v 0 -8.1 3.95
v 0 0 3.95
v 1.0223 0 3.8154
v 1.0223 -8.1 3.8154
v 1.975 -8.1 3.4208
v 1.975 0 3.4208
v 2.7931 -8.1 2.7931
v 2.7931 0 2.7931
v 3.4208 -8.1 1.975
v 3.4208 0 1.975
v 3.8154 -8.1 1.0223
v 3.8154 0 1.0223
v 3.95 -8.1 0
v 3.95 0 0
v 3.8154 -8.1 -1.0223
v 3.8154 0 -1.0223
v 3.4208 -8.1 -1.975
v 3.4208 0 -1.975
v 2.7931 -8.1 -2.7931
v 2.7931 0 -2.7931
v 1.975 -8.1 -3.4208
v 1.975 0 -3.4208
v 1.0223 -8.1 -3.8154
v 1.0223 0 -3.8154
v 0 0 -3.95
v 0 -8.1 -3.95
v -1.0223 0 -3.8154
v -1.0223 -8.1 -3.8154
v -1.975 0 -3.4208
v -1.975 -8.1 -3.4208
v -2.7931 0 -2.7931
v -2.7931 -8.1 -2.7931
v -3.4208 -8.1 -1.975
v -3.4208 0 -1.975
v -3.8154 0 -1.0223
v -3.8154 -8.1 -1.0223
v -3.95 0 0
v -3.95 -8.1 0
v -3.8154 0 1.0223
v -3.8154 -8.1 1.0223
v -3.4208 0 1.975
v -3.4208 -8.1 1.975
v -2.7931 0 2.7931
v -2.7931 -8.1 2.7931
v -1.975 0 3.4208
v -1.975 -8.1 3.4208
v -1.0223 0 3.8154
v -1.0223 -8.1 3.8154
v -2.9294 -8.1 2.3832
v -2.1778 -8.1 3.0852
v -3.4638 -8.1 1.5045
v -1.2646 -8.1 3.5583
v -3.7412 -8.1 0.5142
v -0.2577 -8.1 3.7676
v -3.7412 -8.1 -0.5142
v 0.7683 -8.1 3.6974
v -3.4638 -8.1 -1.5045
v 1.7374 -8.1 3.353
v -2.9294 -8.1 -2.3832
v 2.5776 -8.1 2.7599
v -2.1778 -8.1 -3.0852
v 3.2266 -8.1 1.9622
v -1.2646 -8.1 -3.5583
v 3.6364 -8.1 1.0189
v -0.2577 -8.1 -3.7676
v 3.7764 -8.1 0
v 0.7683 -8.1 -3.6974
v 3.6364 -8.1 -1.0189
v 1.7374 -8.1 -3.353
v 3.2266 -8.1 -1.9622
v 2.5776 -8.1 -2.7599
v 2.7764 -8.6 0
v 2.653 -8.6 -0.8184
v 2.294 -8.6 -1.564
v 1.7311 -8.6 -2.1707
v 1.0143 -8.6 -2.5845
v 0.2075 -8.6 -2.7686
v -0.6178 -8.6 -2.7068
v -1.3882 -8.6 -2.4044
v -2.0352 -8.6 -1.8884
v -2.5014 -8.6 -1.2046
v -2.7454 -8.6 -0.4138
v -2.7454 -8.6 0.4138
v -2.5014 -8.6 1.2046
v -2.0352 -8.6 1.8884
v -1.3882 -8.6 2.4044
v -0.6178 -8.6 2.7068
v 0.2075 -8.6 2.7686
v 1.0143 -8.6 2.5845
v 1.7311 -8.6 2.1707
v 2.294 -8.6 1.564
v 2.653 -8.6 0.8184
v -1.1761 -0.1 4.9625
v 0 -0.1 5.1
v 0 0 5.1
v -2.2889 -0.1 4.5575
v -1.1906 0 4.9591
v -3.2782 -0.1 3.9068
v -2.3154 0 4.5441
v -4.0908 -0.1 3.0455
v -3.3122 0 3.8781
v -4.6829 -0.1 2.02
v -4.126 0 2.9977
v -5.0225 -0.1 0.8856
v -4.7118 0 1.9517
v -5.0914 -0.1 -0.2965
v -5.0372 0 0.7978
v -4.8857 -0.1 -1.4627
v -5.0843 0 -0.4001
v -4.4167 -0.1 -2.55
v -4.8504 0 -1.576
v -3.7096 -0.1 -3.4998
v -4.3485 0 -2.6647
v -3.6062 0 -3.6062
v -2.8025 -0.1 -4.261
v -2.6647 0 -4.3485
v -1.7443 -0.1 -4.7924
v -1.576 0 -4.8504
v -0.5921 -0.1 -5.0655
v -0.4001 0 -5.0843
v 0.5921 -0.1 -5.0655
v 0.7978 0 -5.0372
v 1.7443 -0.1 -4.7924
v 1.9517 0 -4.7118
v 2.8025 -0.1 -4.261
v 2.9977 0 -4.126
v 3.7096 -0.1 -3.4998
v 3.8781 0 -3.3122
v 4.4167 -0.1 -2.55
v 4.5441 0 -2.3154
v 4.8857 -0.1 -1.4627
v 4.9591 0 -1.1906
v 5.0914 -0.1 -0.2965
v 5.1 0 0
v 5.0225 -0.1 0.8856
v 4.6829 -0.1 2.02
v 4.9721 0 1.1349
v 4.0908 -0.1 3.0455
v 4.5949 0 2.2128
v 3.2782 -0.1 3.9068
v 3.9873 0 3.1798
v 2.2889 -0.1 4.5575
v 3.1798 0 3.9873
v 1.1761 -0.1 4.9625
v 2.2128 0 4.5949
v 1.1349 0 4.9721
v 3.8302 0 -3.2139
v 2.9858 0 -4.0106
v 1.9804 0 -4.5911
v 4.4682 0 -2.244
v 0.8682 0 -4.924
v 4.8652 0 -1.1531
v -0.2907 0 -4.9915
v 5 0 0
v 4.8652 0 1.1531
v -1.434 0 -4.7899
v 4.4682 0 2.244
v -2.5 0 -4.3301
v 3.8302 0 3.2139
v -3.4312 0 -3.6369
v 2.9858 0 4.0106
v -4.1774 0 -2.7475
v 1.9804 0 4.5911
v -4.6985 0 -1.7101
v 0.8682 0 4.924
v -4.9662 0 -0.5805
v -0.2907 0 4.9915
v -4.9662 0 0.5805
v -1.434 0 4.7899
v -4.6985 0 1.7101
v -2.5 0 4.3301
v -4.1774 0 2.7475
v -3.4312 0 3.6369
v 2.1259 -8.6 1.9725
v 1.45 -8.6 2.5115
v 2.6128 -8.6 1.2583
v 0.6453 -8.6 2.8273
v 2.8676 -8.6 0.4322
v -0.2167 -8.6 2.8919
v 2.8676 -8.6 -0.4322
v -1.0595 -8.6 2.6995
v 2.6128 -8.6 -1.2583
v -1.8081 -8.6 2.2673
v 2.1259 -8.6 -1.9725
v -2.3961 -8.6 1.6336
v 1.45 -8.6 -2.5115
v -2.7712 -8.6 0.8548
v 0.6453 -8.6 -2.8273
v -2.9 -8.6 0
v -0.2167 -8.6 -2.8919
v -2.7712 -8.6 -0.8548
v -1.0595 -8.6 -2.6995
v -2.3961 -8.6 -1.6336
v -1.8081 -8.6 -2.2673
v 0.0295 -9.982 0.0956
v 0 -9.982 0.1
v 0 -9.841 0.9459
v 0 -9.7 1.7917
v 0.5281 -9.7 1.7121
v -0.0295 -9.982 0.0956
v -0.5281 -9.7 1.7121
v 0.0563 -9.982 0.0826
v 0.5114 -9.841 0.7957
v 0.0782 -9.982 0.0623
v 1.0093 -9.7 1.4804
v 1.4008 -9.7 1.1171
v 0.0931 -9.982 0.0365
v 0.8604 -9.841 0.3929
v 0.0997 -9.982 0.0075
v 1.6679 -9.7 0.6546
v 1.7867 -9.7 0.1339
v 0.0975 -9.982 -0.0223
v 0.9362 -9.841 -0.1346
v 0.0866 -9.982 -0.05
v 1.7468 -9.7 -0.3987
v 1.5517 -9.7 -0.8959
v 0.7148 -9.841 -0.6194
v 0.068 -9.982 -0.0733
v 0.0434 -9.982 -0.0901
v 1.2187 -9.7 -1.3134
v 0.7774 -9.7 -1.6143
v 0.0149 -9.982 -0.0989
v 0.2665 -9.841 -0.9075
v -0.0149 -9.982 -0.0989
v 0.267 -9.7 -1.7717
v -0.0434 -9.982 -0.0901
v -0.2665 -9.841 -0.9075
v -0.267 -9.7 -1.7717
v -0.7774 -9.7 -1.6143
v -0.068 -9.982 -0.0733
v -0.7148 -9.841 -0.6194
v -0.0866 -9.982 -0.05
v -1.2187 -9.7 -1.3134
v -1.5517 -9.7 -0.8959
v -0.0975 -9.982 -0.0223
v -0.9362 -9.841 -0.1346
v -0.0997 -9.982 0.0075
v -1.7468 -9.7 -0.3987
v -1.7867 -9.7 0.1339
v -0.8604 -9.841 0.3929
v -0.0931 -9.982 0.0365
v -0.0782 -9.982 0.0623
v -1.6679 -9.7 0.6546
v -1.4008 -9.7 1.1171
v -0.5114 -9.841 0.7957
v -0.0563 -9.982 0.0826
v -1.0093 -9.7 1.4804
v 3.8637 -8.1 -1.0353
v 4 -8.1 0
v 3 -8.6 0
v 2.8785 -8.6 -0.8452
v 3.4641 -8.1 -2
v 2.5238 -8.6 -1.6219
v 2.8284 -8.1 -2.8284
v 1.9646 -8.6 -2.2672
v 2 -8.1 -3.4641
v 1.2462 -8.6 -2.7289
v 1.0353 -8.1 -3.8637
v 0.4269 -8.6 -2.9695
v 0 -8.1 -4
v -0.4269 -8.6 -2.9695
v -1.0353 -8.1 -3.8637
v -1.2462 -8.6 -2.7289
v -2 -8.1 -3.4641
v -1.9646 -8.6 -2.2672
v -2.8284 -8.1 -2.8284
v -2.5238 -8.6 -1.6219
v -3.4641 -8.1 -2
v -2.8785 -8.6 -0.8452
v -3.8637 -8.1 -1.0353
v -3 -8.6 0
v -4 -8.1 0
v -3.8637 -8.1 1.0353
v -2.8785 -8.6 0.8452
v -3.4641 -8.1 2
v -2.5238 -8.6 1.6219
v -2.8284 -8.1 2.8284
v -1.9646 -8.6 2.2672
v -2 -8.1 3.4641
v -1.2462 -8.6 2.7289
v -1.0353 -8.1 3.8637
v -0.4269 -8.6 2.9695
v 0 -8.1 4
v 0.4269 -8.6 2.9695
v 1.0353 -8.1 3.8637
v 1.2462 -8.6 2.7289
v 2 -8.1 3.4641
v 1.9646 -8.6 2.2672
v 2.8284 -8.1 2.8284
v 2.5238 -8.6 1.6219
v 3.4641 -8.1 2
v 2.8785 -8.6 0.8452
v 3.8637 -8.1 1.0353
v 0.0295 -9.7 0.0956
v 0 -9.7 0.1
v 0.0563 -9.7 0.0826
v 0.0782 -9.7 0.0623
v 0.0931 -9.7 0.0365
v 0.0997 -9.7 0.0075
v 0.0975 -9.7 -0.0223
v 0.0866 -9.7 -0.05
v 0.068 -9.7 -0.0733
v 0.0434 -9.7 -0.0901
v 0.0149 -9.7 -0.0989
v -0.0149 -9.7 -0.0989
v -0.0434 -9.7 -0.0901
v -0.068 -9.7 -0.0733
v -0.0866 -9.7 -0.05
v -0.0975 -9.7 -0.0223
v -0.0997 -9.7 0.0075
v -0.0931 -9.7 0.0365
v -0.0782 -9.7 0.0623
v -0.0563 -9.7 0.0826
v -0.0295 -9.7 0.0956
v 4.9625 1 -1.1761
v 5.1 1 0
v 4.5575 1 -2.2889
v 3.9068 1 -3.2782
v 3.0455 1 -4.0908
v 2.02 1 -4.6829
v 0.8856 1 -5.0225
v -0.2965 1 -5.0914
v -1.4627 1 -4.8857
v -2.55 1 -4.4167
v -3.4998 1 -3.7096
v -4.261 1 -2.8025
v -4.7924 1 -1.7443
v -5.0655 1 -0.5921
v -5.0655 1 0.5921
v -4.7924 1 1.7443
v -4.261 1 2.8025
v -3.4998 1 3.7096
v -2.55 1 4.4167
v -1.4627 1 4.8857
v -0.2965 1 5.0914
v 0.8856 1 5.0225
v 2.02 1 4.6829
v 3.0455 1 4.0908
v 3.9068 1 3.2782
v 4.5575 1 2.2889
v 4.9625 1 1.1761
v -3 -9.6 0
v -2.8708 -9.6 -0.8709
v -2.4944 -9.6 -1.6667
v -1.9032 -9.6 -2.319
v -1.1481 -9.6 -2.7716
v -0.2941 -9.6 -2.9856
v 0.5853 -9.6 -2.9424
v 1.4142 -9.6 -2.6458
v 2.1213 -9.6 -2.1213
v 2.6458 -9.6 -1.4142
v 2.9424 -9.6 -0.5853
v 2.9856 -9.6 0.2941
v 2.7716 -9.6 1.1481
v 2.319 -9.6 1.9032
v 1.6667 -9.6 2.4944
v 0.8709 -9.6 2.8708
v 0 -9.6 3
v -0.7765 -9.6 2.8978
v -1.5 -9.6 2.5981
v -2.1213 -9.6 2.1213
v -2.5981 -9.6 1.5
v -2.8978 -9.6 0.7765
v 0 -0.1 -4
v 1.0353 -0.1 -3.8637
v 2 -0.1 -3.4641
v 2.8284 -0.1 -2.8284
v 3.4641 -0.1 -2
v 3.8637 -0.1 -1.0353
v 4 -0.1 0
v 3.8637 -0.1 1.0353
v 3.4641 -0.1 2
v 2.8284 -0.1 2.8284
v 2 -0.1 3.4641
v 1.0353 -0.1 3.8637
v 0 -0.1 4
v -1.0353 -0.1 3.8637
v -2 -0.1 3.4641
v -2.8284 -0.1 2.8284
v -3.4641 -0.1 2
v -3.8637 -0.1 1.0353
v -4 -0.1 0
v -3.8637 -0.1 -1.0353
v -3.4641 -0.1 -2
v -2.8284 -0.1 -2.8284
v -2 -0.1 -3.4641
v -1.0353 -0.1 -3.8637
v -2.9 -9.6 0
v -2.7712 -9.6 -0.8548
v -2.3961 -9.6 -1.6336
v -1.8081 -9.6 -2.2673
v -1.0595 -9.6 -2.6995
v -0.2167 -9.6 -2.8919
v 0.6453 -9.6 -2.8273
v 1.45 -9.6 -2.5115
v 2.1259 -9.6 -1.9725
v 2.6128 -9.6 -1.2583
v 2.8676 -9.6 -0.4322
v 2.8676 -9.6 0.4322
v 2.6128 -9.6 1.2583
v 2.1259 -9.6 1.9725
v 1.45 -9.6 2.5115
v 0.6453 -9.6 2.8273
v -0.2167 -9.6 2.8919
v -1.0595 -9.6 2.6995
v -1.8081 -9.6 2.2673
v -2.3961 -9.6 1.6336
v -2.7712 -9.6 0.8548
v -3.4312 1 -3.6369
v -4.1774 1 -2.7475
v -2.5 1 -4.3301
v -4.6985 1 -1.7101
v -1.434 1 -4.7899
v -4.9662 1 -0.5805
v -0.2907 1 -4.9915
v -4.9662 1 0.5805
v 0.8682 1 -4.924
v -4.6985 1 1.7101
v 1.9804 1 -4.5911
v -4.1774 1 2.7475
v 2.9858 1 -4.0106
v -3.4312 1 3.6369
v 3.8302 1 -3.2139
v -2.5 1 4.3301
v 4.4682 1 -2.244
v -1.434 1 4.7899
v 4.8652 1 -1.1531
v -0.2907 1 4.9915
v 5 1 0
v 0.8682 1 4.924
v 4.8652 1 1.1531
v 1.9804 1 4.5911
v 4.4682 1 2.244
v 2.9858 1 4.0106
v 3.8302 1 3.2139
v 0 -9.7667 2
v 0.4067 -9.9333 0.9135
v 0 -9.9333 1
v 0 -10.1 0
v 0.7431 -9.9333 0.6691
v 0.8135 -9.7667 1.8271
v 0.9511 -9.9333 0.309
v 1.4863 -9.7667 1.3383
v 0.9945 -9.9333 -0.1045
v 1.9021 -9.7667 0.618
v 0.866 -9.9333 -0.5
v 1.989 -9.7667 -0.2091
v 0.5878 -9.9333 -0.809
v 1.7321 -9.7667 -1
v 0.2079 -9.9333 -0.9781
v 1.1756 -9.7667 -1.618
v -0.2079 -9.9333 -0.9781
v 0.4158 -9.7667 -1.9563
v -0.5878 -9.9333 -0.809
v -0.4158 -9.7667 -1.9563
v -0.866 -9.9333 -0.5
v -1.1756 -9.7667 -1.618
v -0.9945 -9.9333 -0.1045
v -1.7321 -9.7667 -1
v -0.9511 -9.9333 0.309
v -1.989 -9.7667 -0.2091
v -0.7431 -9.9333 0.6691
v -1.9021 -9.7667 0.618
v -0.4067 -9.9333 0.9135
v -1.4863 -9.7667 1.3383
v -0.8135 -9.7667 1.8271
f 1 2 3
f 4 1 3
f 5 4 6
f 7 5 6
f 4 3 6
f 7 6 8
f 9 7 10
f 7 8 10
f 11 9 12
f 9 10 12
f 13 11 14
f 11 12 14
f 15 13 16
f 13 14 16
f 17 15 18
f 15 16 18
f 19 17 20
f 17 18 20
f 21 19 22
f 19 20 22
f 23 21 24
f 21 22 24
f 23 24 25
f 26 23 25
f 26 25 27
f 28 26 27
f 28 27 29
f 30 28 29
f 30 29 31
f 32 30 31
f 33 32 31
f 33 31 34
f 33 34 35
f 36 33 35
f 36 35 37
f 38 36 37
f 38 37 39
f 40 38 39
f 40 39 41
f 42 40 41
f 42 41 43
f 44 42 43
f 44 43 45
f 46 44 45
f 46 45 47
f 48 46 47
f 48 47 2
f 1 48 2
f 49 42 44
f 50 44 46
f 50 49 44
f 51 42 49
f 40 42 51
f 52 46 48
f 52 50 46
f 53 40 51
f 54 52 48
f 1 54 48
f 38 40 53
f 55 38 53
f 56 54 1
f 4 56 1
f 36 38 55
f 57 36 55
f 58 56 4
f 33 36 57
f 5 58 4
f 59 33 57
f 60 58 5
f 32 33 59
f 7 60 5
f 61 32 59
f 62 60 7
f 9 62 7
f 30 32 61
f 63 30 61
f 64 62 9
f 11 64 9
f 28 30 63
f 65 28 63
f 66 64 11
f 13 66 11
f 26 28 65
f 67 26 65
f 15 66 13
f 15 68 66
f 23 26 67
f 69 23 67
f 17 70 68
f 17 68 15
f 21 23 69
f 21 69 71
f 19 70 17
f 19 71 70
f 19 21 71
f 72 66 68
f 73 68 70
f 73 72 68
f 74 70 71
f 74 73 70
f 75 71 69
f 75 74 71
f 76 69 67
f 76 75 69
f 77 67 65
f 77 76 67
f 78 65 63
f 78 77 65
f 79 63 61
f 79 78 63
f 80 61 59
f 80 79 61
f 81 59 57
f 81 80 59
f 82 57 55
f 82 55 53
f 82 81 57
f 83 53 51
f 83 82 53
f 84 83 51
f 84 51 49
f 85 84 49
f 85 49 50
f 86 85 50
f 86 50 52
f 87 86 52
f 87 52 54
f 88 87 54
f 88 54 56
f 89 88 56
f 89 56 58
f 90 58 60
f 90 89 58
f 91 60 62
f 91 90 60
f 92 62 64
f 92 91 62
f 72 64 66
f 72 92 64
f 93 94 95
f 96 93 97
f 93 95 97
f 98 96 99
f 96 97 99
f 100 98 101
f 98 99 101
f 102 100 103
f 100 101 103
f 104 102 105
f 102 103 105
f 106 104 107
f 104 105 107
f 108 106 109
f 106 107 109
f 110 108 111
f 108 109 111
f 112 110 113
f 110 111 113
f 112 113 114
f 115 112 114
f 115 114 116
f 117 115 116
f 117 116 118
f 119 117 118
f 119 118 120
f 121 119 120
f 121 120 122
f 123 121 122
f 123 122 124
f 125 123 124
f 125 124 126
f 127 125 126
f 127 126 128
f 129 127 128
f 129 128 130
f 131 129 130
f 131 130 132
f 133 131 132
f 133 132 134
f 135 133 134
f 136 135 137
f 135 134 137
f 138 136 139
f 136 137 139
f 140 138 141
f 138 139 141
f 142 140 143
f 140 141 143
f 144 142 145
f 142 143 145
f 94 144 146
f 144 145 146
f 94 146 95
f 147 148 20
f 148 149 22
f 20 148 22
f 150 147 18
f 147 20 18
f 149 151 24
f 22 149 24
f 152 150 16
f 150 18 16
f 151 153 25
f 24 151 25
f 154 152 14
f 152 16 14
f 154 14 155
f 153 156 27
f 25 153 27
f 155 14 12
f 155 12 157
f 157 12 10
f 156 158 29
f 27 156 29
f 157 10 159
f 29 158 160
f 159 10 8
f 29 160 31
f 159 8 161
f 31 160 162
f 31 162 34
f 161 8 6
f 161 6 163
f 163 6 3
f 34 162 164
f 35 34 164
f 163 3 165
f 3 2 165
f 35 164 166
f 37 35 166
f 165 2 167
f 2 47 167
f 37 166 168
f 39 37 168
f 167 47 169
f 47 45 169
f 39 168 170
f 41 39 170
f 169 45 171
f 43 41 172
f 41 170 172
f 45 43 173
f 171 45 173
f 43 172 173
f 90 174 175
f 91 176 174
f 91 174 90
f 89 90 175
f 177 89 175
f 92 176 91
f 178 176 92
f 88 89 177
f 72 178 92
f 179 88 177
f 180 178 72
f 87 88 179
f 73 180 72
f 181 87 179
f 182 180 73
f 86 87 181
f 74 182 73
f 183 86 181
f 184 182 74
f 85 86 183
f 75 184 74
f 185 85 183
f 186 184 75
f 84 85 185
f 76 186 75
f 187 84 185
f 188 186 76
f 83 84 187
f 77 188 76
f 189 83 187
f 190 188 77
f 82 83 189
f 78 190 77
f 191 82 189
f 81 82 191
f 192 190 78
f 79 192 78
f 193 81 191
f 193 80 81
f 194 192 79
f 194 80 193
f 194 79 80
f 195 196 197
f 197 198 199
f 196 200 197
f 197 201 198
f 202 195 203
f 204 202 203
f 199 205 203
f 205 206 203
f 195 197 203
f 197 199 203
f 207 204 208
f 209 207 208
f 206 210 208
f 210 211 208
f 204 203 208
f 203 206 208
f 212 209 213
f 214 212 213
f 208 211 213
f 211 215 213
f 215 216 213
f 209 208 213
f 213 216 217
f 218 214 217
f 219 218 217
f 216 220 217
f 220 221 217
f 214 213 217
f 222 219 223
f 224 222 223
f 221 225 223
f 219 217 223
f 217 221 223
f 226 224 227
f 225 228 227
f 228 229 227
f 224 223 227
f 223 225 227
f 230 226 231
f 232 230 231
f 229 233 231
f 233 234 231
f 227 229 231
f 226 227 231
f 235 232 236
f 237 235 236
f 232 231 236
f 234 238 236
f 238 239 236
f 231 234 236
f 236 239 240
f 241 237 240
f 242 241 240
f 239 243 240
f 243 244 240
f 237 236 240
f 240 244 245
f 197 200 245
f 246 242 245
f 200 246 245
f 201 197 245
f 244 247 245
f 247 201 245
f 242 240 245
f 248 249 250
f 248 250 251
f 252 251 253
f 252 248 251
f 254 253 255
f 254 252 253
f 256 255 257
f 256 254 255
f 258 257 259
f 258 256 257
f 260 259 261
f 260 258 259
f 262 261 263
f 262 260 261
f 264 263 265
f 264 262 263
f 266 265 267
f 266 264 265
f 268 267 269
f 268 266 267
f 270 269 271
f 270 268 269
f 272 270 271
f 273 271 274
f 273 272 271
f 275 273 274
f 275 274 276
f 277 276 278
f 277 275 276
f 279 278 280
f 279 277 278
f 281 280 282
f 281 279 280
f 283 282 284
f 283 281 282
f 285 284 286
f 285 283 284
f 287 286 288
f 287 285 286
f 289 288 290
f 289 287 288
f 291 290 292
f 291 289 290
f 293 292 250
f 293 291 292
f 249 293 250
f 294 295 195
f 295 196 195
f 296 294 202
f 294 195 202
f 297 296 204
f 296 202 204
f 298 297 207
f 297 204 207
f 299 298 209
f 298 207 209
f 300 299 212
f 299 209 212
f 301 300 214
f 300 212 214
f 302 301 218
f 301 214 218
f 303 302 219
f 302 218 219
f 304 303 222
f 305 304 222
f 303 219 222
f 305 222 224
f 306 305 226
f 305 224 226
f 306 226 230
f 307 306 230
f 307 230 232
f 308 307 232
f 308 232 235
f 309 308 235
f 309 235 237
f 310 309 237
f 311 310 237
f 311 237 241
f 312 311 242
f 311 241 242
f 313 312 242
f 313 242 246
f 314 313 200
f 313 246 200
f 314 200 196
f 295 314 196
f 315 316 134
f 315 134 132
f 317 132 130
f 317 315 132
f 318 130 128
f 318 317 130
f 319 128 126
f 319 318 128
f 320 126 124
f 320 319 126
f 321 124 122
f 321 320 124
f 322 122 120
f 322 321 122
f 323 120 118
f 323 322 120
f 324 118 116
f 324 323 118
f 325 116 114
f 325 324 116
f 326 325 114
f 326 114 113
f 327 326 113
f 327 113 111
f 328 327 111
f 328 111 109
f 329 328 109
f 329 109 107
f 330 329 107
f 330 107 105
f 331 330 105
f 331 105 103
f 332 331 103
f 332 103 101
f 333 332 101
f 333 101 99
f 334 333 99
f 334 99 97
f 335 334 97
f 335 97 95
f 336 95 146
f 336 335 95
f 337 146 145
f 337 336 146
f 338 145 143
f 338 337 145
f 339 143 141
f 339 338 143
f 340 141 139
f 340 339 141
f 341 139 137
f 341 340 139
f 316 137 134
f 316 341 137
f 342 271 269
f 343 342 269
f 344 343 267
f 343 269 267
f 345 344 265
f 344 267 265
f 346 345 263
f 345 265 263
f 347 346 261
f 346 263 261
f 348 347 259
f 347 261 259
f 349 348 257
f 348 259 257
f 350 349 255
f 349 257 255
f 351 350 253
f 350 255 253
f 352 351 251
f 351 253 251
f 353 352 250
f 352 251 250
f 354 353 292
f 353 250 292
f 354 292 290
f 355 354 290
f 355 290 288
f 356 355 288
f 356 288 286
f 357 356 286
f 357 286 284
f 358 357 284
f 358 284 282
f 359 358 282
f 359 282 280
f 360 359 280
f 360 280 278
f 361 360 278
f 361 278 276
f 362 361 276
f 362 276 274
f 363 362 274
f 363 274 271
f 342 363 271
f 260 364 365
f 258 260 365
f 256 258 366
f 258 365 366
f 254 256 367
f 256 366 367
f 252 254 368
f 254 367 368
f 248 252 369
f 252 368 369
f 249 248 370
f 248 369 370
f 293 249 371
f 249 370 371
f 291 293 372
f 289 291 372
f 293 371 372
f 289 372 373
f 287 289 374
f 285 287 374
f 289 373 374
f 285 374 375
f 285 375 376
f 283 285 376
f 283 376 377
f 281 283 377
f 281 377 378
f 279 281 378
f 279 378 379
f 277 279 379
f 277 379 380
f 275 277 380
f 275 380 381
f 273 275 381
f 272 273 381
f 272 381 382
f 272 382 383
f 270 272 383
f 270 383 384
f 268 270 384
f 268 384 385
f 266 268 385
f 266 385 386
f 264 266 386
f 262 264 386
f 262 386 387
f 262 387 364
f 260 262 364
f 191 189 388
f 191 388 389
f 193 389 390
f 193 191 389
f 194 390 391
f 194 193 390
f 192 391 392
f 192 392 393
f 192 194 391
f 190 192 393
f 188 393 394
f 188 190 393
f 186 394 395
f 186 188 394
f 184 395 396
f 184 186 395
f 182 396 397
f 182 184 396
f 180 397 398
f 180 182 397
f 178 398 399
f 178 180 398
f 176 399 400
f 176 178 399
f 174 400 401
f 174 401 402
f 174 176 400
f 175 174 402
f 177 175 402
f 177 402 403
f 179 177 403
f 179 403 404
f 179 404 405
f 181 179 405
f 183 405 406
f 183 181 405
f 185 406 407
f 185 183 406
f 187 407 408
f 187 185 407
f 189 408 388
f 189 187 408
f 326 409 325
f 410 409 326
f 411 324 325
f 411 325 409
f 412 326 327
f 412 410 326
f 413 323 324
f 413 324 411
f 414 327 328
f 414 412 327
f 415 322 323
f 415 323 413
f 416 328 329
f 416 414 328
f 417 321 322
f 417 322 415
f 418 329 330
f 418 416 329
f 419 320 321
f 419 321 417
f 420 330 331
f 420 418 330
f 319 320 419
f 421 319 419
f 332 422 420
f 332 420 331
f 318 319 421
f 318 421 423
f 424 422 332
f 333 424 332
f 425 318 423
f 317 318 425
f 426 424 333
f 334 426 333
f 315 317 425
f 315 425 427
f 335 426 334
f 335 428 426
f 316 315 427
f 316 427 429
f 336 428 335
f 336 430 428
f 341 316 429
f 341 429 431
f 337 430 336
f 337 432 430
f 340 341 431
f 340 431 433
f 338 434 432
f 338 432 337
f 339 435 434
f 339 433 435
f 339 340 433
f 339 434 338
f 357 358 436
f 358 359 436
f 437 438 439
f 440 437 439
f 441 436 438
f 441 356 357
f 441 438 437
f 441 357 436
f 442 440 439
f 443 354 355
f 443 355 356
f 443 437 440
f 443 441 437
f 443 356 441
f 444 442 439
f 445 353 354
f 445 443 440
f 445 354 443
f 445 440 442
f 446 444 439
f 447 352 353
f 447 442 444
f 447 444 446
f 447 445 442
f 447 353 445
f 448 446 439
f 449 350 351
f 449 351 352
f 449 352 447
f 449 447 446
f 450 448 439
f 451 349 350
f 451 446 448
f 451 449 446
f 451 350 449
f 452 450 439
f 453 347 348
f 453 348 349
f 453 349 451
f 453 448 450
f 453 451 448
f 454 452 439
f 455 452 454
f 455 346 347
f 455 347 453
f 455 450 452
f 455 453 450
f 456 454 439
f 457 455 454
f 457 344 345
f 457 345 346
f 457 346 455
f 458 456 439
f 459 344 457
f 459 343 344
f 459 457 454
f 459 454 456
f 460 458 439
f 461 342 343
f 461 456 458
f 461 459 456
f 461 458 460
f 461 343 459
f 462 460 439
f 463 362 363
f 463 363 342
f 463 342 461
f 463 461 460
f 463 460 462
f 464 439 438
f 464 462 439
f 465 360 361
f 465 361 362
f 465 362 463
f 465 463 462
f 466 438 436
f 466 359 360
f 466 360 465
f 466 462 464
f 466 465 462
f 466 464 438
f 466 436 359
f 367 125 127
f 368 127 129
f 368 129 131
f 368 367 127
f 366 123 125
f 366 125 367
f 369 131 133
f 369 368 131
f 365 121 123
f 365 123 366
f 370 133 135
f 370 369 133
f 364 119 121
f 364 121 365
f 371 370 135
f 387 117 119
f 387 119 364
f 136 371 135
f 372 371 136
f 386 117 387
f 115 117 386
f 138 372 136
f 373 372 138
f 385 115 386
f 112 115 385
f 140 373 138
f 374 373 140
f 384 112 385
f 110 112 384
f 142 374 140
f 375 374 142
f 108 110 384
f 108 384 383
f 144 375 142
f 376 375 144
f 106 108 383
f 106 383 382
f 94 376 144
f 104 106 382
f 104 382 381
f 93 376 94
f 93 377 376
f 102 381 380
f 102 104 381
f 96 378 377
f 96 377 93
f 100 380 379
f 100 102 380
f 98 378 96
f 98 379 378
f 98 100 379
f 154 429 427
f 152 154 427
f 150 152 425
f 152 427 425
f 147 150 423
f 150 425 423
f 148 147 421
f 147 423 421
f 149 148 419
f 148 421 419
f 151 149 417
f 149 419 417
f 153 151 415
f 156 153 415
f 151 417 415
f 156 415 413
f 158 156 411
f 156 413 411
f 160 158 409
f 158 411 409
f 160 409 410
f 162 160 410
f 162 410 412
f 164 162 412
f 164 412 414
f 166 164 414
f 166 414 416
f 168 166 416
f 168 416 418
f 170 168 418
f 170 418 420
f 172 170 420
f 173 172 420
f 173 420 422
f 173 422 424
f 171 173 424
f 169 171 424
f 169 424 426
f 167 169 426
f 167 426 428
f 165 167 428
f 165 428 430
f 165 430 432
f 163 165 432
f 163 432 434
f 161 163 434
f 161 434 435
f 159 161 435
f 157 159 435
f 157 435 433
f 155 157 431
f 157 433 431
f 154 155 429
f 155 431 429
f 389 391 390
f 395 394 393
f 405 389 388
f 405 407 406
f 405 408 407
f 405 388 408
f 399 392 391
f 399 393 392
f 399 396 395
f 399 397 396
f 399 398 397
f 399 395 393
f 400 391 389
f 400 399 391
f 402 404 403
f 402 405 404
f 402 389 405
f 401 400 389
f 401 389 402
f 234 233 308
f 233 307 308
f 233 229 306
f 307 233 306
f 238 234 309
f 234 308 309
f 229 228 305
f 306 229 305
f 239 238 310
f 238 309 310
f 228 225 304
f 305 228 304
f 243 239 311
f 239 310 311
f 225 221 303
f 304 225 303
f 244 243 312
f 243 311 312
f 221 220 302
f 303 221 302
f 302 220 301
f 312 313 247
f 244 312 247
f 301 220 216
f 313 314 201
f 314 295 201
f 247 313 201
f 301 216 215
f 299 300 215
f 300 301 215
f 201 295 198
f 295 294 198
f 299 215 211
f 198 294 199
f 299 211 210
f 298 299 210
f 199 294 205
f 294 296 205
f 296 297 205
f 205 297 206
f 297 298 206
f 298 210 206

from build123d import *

# Parameters (mm, degrees)
SKETCH1_R           = 5.1
SKETCH1_R_2         = 5
SKETCH8_R           = 5.1
BOSS_EXTRUDE2_DEPTH = 0.1
SKETCH9_R           = 4
BOSS_EXTRUDE3_DEPTH = 8
SKETCH10_R          = 3.95
CUT_EXTRUDE1_DEPTH  = 11.84573649
SKETCH12_4_R        = 3
SKETCH12_4_R_2      = 2.9
EXTRUDE_THIN2_DEPTH = 1


# Read off the part's stored shape, not the designer's step: Loft-Thin7
with BuildPart() as part:
    # Sweep-Thin1: sweep along a path in Sketch3
    with BuildLine(Plane(origin=(0, 0, 0), x_dir=(0, 0, -1), z_dir=(1, 0, 0))) as sweep_thin1_path:
        Line((0, 0), (0, 1))
    # Sketch1 → Sweep-Thin1 (sweep)
    with BuildSketch(Plane(origin=(0, 0, 0), x_dir=(1, 0, 0), z_dir=(0, 1, 0))):
        Circle(SKETCH1_R)
        Circle(SKETCH1_R_2, mode=Mode.SUBTRACT)
    sweep(path=sweep_thin1_path.line)

    # Sketch8 → Boss-Extrude2 (add)
    with BuildSketch(Plane(origin=(0, 0, 0), x_dir=(-1, 0, 0), z_dir=(0, -1, 0))):
        with Locations(Location((0, 0, 0), (0, 0, 270))):
            Circle(SKETCH8_R)
    extrude(amount=BOSS_EXTRUDE2_DEPTH)

    # Sketch9 → Boss-Extrude3 (add)
    with BuildSketch(Plane(origin=(0, -0.1, 0), x_dir=(-1, 0, 0), z_dir=(0, -1, 0))):
        with Locations(Location((0, 0, 0), (0, 0, 90))):
            Circle(SKETCH9_R)
    extrude(amount=BOSS_EXTRUDE3_DEPTH)

    # Sketch10 → Cut-Extrude1 (cut, through all)
    with BuildSketch(Plane(origin=(0, 0, 0), x_dir=(1, 0, 0), z_dir=(0, 1, 0))):
        with Locations(Location((0, 0, 0), (0, 0, 270))):
            Circle(SKETCH10_R)
    extrude(amount=-CUT_EXTRUDE1_DEPTH, mode=Mode.SUBTRACT)

    # Loft-Thin7 outline → Loft-Thin7 (revolve)
    with BuildSketch(Plane.XY):
        Polygon((4, -8.1), (3.776393202, -8.1), (2.776393202, -8.6), (3, -8.6), align=None)
    revolve(axis=Axis((0, 0, 0), (0, 1, 0)))

    # Sketch12<4> → Extrude-Thin2 (add)
    with BuildSketch(Plane(origin=(0, -8.6, 0), x_dir=(-1, 0, 0), z_dir=(0, -1, 0))):
        Circle(SKETCH12_4_R)
        Circle(SKETCH12_4_R_2, mode=Mode.SUBTRACT)
    extrude(amount=EXTRUDE_THIN2_DEPTH)

    # Sketch16 → Revolve-Thin2 (revolve)
    with BuildSketch(Plane.XY, mode=Mode.PRIVATE) as revolve_thin2_sk:
        Polygon((0, -9.6), (0, -10.1), (3, -9.6), align=None)
        Polygon((0.1, -9.7), (0.1, -9.981953958), (1.791723747, -9.7), align=None, mode=Mode.SUBTRACT)
    revolve(revolve_thin2_sk.sketch.rotate(Axis((0, -16.369174854, 0), (0, 1, 0)), 270), axis=Axis((0, -16.369174854, 0), (0, 1, 0)))


solid = part.part
